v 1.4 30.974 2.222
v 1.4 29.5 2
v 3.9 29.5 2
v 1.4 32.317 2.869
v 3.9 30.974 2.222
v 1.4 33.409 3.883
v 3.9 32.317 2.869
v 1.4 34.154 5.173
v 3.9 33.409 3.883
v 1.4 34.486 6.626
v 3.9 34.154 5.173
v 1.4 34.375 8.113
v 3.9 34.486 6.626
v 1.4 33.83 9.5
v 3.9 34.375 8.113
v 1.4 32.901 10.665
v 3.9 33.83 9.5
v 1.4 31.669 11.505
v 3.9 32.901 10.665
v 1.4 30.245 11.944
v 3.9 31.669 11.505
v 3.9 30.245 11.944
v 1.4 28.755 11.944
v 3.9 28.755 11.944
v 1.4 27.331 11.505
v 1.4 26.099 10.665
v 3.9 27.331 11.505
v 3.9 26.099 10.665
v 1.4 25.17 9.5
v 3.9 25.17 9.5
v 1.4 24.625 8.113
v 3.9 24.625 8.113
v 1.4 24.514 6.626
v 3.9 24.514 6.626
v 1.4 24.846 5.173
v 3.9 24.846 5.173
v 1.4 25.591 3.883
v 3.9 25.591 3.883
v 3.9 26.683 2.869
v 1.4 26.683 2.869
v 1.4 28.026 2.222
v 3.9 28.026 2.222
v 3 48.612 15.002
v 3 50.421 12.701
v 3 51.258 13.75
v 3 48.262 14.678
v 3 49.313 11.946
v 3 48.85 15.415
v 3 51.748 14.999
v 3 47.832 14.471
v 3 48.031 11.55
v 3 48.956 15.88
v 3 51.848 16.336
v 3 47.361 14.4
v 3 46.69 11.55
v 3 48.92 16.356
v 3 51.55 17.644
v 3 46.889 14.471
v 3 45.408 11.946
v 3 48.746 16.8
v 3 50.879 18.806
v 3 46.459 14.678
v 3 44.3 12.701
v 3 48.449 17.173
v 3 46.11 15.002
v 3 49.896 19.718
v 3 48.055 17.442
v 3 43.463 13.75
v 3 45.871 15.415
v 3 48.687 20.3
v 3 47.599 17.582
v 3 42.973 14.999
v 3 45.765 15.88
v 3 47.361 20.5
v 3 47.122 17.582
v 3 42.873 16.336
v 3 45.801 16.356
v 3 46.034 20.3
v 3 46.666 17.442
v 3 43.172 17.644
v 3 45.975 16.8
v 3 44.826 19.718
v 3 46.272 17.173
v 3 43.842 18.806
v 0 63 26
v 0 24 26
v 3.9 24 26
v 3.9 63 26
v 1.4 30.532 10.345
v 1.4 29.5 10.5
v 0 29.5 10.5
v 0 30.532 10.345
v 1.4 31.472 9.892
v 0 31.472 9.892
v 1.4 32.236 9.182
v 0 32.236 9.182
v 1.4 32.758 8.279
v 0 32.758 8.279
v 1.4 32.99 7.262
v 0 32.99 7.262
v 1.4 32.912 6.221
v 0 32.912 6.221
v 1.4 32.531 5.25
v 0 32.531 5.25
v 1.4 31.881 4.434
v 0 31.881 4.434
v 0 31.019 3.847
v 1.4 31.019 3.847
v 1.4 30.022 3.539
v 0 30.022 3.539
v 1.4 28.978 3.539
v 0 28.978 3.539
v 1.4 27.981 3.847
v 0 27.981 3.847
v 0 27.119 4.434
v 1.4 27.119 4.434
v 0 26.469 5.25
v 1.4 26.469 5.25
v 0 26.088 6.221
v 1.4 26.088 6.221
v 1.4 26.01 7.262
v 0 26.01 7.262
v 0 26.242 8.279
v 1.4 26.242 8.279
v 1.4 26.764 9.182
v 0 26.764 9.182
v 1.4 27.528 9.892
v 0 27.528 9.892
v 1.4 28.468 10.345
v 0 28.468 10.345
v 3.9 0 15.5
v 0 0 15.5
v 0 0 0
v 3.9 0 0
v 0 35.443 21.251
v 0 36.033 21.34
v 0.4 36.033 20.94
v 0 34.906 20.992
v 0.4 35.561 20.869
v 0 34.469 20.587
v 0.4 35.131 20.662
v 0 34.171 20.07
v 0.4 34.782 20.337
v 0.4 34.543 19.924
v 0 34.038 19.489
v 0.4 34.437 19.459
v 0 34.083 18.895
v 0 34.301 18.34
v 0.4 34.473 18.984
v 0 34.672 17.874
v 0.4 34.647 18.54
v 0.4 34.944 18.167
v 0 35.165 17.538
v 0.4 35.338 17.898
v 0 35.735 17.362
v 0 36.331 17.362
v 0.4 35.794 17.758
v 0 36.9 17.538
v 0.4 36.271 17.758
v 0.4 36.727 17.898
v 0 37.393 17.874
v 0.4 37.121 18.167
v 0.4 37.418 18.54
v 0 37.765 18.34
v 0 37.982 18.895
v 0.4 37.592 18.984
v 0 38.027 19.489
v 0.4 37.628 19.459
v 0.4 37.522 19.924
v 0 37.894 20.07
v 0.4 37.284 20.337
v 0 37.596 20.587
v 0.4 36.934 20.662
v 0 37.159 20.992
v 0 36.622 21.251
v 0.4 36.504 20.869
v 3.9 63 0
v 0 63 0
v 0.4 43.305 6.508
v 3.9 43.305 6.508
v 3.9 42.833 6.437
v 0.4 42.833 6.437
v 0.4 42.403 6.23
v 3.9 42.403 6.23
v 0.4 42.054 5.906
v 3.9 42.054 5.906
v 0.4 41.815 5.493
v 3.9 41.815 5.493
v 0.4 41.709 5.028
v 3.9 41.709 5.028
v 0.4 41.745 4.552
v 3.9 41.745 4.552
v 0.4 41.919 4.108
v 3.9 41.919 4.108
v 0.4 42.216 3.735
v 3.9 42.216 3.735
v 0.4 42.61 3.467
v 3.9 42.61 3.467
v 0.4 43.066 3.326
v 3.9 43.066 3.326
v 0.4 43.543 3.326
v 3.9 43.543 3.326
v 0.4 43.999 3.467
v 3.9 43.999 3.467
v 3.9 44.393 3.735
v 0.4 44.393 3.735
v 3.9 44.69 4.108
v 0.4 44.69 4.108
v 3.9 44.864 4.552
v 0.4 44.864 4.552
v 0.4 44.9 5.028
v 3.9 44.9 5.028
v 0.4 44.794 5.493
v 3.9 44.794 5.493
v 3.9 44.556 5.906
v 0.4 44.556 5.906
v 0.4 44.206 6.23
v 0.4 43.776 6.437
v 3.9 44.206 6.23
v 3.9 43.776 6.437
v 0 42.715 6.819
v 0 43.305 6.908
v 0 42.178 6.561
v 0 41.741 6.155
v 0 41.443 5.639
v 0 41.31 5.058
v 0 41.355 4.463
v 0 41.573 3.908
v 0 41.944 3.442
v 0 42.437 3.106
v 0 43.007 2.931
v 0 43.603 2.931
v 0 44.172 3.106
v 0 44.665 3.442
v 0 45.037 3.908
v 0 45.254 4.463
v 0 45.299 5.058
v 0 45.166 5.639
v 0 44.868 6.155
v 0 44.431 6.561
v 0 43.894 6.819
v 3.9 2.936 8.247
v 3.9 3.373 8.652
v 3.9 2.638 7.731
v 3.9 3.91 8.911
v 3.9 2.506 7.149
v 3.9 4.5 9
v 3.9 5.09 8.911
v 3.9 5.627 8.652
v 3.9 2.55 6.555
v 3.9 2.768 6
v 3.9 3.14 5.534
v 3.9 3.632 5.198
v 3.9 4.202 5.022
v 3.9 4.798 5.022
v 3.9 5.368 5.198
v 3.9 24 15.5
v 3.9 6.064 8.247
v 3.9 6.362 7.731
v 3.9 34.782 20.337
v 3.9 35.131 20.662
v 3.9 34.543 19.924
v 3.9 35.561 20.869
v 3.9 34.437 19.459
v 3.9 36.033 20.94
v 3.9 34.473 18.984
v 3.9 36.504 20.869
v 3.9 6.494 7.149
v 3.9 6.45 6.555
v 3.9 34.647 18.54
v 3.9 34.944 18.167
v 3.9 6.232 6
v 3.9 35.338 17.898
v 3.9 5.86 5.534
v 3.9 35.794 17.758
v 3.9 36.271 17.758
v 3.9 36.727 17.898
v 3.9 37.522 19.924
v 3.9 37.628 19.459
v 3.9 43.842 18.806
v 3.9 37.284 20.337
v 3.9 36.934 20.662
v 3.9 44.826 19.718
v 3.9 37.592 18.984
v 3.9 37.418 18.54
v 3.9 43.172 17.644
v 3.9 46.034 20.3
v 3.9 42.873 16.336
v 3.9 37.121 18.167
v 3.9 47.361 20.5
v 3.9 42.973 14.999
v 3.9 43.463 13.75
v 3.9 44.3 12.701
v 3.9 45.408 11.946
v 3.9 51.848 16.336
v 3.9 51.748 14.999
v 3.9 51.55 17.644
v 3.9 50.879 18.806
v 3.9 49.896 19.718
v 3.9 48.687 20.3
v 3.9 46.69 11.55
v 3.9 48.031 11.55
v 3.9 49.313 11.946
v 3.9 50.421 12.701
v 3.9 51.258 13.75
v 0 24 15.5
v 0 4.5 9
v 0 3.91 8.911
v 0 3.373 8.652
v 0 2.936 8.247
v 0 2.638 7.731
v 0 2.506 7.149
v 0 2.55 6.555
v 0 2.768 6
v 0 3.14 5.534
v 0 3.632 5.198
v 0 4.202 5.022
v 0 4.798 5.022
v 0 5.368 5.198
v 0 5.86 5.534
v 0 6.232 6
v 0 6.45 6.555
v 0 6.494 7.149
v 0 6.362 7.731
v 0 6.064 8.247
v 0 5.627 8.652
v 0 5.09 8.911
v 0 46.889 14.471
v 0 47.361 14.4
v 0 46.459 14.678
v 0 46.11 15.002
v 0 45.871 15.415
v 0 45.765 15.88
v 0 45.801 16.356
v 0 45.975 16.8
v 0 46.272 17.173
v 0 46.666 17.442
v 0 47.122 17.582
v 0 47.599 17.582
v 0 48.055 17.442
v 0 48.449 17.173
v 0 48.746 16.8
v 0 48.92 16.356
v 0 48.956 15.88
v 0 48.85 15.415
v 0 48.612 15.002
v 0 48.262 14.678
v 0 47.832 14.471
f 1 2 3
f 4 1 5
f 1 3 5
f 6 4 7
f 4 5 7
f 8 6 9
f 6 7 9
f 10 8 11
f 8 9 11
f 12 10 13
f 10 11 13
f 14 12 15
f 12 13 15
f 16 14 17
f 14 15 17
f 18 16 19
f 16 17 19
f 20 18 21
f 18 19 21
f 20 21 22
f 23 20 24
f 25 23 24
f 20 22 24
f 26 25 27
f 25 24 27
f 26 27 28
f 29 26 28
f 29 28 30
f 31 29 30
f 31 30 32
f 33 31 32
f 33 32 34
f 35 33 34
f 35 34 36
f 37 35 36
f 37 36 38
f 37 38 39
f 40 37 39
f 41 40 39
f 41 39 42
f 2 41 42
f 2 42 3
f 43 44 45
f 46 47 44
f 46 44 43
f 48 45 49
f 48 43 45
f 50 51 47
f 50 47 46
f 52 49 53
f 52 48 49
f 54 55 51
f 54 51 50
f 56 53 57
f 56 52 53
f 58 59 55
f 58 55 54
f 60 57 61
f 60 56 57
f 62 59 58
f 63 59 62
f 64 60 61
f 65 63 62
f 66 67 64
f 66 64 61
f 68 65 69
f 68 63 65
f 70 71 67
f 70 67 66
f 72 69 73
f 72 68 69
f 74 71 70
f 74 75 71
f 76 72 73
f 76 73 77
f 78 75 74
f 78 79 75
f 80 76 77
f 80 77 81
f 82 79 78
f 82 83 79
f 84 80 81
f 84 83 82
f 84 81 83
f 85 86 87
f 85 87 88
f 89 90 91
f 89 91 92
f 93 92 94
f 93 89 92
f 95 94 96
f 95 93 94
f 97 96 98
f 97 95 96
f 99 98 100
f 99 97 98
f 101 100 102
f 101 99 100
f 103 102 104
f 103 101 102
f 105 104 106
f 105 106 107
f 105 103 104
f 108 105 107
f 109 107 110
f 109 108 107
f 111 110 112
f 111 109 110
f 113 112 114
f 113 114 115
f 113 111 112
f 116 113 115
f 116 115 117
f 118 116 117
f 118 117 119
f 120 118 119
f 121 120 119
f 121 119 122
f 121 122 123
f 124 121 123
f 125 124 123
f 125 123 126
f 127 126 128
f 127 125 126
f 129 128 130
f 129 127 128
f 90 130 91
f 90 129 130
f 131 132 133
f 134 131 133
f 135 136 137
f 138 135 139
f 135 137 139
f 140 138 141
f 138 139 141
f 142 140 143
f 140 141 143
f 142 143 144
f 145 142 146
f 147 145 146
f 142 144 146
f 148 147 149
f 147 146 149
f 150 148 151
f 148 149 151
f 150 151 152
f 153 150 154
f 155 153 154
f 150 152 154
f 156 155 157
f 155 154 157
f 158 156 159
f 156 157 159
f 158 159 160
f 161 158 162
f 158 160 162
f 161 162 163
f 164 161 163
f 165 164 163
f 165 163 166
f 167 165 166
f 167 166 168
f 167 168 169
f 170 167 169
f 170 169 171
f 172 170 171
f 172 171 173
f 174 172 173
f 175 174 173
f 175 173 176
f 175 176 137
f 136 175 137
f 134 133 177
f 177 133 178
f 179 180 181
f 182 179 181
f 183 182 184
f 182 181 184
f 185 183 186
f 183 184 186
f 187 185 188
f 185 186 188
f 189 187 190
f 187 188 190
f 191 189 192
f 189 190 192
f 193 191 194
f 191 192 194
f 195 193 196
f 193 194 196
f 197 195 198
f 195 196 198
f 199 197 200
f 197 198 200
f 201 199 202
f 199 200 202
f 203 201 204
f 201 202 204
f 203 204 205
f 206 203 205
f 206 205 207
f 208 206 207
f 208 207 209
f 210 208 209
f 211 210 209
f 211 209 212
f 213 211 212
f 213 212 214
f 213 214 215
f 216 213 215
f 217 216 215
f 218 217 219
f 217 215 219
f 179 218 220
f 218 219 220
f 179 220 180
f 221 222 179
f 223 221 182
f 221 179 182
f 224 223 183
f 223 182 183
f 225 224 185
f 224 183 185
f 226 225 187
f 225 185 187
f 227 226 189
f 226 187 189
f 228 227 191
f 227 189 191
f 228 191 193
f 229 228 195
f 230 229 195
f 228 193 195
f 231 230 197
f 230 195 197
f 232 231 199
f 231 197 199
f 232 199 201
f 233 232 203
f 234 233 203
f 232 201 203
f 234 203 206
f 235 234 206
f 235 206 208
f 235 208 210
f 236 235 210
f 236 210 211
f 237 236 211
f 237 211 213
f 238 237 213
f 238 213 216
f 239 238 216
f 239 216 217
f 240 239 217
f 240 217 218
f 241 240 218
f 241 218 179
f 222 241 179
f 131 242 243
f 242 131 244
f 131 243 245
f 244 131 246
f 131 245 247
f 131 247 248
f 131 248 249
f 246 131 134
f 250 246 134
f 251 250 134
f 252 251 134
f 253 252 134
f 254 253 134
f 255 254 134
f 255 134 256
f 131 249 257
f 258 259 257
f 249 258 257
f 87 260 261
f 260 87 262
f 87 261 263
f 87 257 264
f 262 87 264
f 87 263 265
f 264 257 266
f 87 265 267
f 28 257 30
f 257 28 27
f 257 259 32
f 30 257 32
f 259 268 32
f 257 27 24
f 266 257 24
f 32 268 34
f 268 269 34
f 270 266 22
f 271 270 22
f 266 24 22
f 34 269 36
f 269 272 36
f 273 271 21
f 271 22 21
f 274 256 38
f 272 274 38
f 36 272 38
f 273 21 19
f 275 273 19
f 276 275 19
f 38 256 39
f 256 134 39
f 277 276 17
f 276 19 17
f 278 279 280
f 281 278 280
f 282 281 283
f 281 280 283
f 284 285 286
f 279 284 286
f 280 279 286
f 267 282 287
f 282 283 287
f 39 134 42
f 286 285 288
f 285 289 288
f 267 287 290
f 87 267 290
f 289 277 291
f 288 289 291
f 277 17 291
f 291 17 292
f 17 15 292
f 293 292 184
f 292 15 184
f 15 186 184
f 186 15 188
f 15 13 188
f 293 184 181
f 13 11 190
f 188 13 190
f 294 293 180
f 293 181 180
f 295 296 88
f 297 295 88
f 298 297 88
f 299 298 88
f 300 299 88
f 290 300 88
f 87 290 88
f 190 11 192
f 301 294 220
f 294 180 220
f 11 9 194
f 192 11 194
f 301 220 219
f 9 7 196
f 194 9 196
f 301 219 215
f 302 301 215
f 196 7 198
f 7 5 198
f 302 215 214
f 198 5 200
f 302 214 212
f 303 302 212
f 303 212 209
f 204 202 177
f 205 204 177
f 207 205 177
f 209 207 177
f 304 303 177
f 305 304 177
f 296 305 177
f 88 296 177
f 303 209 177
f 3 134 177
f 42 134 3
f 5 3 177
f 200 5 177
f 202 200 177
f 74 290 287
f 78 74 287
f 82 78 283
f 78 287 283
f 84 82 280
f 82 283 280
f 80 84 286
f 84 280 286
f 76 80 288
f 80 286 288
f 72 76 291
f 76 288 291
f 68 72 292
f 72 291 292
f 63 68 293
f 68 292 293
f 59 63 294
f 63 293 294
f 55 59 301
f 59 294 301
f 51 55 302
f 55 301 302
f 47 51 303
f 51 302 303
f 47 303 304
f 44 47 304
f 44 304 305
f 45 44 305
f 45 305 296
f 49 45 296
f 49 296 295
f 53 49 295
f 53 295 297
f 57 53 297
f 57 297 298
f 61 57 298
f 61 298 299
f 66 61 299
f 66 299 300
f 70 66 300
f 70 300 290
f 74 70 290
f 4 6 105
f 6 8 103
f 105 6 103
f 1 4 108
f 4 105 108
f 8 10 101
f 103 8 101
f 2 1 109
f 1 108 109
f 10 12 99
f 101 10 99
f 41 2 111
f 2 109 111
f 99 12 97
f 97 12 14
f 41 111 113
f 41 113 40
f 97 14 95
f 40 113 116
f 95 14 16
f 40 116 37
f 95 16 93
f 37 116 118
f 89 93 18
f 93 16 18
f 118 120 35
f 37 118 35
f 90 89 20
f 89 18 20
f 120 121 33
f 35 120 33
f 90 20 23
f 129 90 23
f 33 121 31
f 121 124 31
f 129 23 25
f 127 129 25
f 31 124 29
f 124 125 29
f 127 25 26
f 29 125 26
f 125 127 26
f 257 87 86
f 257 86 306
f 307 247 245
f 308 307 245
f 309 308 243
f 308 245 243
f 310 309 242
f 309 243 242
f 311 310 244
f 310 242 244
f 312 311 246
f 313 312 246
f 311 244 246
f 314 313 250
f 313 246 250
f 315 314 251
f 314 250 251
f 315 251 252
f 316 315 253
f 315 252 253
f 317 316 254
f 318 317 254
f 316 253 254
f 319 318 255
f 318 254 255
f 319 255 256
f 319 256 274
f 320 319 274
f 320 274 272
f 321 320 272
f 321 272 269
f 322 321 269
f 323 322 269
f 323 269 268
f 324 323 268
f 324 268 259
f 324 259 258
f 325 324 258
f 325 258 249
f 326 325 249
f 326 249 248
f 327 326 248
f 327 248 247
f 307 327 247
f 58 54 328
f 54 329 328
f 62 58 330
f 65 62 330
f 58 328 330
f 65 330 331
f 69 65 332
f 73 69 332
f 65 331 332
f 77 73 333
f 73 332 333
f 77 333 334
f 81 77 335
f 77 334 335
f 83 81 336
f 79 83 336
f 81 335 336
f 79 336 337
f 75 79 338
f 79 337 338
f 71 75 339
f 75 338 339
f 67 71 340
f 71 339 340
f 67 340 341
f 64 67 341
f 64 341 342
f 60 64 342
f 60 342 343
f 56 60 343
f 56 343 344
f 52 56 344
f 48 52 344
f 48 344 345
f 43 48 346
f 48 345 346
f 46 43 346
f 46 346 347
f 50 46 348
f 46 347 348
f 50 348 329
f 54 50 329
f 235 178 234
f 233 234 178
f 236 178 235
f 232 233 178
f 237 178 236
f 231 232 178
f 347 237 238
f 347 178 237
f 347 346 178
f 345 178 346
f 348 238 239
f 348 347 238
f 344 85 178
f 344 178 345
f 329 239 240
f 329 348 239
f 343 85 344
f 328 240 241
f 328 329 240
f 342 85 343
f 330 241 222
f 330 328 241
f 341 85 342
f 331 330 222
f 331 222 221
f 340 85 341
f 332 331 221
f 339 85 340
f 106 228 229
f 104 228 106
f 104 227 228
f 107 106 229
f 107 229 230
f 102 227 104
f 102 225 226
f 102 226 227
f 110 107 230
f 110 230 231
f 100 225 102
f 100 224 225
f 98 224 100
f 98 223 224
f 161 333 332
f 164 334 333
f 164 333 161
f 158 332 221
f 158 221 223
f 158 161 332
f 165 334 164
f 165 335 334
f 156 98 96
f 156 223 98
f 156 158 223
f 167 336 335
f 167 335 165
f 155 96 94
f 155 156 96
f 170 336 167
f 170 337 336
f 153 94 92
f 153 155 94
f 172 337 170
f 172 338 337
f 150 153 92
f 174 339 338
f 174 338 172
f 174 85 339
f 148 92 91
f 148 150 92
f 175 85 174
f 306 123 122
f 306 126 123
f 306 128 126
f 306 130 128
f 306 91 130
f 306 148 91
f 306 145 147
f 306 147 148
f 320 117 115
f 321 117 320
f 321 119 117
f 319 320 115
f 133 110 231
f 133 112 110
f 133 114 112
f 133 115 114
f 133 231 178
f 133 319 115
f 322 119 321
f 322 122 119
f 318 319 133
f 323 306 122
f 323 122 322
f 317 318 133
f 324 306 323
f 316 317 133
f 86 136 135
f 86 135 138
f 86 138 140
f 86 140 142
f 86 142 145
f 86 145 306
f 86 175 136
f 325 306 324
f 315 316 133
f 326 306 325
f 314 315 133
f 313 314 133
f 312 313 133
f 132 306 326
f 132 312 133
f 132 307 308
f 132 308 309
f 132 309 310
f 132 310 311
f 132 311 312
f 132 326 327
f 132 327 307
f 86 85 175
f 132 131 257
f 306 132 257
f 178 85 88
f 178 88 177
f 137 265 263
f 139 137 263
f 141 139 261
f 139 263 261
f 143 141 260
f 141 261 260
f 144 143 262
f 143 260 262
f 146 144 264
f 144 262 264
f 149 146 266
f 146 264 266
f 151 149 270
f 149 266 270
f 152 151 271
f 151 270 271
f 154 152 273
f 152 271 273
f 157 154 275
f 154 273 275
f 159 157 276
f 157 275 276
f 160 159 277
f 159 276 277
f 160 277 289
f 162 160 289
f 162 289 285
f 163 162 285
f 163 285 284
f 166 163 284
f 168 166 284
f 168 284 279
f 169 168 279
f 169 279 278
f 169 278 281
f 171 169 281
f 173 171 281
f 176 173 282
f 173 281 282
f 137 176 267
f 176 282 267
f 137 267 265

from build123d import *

# Parameters (mm, degrees)
SKETCH1_W                                        = 30
SKETCH1_H                                        = 63
BOSS_EXTRUDE1_DEPTH                              = 4
SKETCH2_R                                        = 5
CUT_EXTRUDE1_DEPTH                               = 70.89277502
F_4_0_4_DIAMETER_HOLE1_D                         = 4
SKETCH12_W                                       = 14.5
SKETCH12_H                                       = 24
CUT_EXTRUDE2_DEPTH                               = 70.89277502
SKETCH13_W                                       = 42.673617324
SKETCH13_H                                       = 65.779819875
CUT_EXTRUDE5_DEPTH                               = 4
F_4_0_4_DIAMETER_HOLE6_D                         = 4
CBORE_FOR_M3_PAN_HEAD_MACHINE_SCREW7_D           = 3.2
CBORE_FOR_M3_PAN_HEAD_MACHINE_SCREW7_CBORE_D     = 9
CBORE_FOR_M3_PAN_HEAD_MACHINE_SCREW7_CBORE_DEPTH = 1
CSK_FOR_M3_FLAT_HEAD_MACHINE_SCREW1_D            = 3.2
CSK_FOR_M3_FLAT_HEAD_MACHINE_SCREW1_CSINK_D      = 4
CSK_FOR_M3_FLAT_HEAD_MACHINE_SCREW1_CSINK_ANGLE  = 90
CUT_EXTRUDE6_DEPTH                               = 70.89277502
CUT_EXTRUDE6_DEPTH_BACK                          = 70.89277502
SKETCH45_W                                       = 4
SKETCH45_H                                       = 39
SKETCH46_W                                       = 0.1
SKETCH46_H                                       = 63
CUT_EXTRUDE7_DEPTH                               = 69.271516755
BOSS_EXTRUDE2_START                              = -1.4
SKETCH47_R                                       = 5
SKETCH47_R_2                                     = 3.5
BOSS_EXTRUDE2_DEPTH                              = 1.4


with BuildPart() as part:
    # Sketch1 → Boss-Extrude1 (new body)
    with BuildSketch(Plane(origin=(0, 0, 0), x_dir=(0, 0, -1), z_dir=(1, 0, 0))):
        with Locations((-15, 31.5)):
            Rectangle(SKETCH1_W, SKETCH1_H)
    boss_extrude1 = extrude(amount=-BOSS_EXTRUDE1_DEPTH)

    # Sketch2 → Cut-Extrude1 (cut, through all)
    with BuildSketch(Plane(origin=(0, 0, 0), x_dir=(0, 0, -1), z_dir=(1, 0, 0))):
        with Locations((-7, 29.5)):
            Circle(SKETCH2_R)
    cut_extrude1 = extrude(amount=-CUT_EXTRUDE1_DEPTH, mode=Mode.SUBTRACT)

    # Ø4.0 (4) Diameter Hole1 (through all)
    with Locations(Plane(origin=(0, 4.5, 7), x_dir=(0, 0, 1), z_dir=(1, 0, 0))):
        with Locations((0, 0)):
            Hole(F_4_0_4_DIAMETER_HOLE1_D / 2)

    # Sketch12 → Cut-Extrude2 (cut, through all)
    with BuildSketch(Plane(origin=(0, 0, 0), x_dir=(0, 0, -1), z_dir=(1, 0, 0))):
        with Locations((-22.75, 12)):
            Rectangle(SKETCH12_W, SKETCH12_H)
    cut_extrude2 = extrude(amount=-CUT_EXTRUDE2_DEPTH, mode=Mode.SUBTRACT)

    # Mirror7: Boss-Extrude1, Cut-Extrude1, Cut-Extrude2 across plane
    add(boss_extrude1.mirror(Plane(origin=(0, 0, 0), x_dir=(0, 0, 1), z_dir=(1, 0, 0))))
    add(cut_extrude1.mirror(Plane(origin=(0, 0, 0), x_dir=(0, 0, 1), z_dir=(1, 0, 0))), mode=Mode.SUBTRACT)
    add(cut_extrude2.mirror(Plane(origin=(0, 0, 0), x_dir=(0, 0, 1), z_dir=(1, 0, 0))), mode=Mode.SUBTRACT)

    # Sketch13 → Cut-Extrude5 (cut)
    with BuildSketch(Plane.ZY.offset(4)):
        with Locations((15.520409967, 30.110090063)):
            Rectangle(SKETCH13_W, SKETCH13_H)
    extrude(amount=-CUT_EXTRUDE5_DEPTH, mode=Mode.SUBTRACT)

    # Ø4.0 (4) Diameter Hole6 (through all)
    with Locations(Plane(origin=(0, 4.5, 7), x_dir=(0, 0, -1), z_dir=(-1, 0, 0))):
        with Locations((0, 0)):
            Hole(F_4_0_4_DIAMETER_HOLE6_D / 2)

    # CBORE for M3 Pan Head Machine Screw7 (through all)
    with Locations(Plane(origin=(4, 47.360571099, 16), x_dir=(0, 0, 1), z_dir=(1, 0, 0))):
        with Locations((0, 0)):
            CounterBoreHole(CBORE_FOR_M3_PAN_HEAD_MACHINE_SCREW7_D / 2, CBORE_FOR_M3_PAN_HEAD_MACHINE_SCREW7_CBORE_D / 2, CBORE_FOR_M3_PAN_HEAD_MACHINE_SCREW7_CBORE_DEPTH)

    # CSK for M3 Flat Head Machine Screw1 (through all)
    with Locations(Plane(origin=(0, 36.032608687, 19.33966579), x_dir=(0, 0, -1), z_dir=(-1, 0, 0))):
        with Locations((0, 0), (14.431341448, -7.272)):
            CounterSinkHole(CSK_FOR_M3_FLAT_HEAD_MACHINE_SCREW1_D / 2, CSK_FOR_M3_FLAT_HEAD_MACHINE_SCREW1_CSINK_D / 2, counter_sink_angle=CSK_FOR_M3_FLAT_HEAD_MACHINE_SCREW1_CSINK_ANGLE)

    # Sketch45 → Cut-Extrude6 (cut, two sides: drawn at the far end of the back side and taken through both)
    with BuildSketch(Plane(origin=(4, 0, 0), x_dir=(0, 0, -1), z_dir=(1, 0, 0)).offset(-CUT_EXTRUDE6_DEPTH_BACK)):
        with Locations((-28, 43.5)):
            Rectangle(SKETCH45_W, SKETCH45_H)
    extrude(amount=CUT_EXTRUDE6_DEPTH + CUT_EXTRUDE6_DEPTH_BACK, mode=Mode.SUBTRACT)

    # Sketch46 → Cut-Extrude7 (cut, through all)
    with BuildSketch(Plane(origin=(0, 0, 0), x_dir=(-1, 0, 0), z_dir=(0, 0, -1))):
        with Locations((-3.95, 31.5)):
            Rectangle(SKETCH46_W, SKETCH46_H)
    extrude(amount=-CUT_EXTRUDE7_DEPTH, mode=Mode.SUBTRACT)

    # Sketch47 → Boss-Extrude2 (add)
    with BuildSketch(Plane.ZY.offset(BOSS_EXTRUDE2_START)):
        with Locations(Location((7, 29.5, 0), (0, 0, 270))):
            Circle(SKETCH47_R)
        with Locations((7, 29.5)):
            Circle(SKETCH47_R_2, mode=Mode.SUBTRACT)
    extrude(amount=BOSS_EXTRUDE2_DEPTH)


solid = part.part
